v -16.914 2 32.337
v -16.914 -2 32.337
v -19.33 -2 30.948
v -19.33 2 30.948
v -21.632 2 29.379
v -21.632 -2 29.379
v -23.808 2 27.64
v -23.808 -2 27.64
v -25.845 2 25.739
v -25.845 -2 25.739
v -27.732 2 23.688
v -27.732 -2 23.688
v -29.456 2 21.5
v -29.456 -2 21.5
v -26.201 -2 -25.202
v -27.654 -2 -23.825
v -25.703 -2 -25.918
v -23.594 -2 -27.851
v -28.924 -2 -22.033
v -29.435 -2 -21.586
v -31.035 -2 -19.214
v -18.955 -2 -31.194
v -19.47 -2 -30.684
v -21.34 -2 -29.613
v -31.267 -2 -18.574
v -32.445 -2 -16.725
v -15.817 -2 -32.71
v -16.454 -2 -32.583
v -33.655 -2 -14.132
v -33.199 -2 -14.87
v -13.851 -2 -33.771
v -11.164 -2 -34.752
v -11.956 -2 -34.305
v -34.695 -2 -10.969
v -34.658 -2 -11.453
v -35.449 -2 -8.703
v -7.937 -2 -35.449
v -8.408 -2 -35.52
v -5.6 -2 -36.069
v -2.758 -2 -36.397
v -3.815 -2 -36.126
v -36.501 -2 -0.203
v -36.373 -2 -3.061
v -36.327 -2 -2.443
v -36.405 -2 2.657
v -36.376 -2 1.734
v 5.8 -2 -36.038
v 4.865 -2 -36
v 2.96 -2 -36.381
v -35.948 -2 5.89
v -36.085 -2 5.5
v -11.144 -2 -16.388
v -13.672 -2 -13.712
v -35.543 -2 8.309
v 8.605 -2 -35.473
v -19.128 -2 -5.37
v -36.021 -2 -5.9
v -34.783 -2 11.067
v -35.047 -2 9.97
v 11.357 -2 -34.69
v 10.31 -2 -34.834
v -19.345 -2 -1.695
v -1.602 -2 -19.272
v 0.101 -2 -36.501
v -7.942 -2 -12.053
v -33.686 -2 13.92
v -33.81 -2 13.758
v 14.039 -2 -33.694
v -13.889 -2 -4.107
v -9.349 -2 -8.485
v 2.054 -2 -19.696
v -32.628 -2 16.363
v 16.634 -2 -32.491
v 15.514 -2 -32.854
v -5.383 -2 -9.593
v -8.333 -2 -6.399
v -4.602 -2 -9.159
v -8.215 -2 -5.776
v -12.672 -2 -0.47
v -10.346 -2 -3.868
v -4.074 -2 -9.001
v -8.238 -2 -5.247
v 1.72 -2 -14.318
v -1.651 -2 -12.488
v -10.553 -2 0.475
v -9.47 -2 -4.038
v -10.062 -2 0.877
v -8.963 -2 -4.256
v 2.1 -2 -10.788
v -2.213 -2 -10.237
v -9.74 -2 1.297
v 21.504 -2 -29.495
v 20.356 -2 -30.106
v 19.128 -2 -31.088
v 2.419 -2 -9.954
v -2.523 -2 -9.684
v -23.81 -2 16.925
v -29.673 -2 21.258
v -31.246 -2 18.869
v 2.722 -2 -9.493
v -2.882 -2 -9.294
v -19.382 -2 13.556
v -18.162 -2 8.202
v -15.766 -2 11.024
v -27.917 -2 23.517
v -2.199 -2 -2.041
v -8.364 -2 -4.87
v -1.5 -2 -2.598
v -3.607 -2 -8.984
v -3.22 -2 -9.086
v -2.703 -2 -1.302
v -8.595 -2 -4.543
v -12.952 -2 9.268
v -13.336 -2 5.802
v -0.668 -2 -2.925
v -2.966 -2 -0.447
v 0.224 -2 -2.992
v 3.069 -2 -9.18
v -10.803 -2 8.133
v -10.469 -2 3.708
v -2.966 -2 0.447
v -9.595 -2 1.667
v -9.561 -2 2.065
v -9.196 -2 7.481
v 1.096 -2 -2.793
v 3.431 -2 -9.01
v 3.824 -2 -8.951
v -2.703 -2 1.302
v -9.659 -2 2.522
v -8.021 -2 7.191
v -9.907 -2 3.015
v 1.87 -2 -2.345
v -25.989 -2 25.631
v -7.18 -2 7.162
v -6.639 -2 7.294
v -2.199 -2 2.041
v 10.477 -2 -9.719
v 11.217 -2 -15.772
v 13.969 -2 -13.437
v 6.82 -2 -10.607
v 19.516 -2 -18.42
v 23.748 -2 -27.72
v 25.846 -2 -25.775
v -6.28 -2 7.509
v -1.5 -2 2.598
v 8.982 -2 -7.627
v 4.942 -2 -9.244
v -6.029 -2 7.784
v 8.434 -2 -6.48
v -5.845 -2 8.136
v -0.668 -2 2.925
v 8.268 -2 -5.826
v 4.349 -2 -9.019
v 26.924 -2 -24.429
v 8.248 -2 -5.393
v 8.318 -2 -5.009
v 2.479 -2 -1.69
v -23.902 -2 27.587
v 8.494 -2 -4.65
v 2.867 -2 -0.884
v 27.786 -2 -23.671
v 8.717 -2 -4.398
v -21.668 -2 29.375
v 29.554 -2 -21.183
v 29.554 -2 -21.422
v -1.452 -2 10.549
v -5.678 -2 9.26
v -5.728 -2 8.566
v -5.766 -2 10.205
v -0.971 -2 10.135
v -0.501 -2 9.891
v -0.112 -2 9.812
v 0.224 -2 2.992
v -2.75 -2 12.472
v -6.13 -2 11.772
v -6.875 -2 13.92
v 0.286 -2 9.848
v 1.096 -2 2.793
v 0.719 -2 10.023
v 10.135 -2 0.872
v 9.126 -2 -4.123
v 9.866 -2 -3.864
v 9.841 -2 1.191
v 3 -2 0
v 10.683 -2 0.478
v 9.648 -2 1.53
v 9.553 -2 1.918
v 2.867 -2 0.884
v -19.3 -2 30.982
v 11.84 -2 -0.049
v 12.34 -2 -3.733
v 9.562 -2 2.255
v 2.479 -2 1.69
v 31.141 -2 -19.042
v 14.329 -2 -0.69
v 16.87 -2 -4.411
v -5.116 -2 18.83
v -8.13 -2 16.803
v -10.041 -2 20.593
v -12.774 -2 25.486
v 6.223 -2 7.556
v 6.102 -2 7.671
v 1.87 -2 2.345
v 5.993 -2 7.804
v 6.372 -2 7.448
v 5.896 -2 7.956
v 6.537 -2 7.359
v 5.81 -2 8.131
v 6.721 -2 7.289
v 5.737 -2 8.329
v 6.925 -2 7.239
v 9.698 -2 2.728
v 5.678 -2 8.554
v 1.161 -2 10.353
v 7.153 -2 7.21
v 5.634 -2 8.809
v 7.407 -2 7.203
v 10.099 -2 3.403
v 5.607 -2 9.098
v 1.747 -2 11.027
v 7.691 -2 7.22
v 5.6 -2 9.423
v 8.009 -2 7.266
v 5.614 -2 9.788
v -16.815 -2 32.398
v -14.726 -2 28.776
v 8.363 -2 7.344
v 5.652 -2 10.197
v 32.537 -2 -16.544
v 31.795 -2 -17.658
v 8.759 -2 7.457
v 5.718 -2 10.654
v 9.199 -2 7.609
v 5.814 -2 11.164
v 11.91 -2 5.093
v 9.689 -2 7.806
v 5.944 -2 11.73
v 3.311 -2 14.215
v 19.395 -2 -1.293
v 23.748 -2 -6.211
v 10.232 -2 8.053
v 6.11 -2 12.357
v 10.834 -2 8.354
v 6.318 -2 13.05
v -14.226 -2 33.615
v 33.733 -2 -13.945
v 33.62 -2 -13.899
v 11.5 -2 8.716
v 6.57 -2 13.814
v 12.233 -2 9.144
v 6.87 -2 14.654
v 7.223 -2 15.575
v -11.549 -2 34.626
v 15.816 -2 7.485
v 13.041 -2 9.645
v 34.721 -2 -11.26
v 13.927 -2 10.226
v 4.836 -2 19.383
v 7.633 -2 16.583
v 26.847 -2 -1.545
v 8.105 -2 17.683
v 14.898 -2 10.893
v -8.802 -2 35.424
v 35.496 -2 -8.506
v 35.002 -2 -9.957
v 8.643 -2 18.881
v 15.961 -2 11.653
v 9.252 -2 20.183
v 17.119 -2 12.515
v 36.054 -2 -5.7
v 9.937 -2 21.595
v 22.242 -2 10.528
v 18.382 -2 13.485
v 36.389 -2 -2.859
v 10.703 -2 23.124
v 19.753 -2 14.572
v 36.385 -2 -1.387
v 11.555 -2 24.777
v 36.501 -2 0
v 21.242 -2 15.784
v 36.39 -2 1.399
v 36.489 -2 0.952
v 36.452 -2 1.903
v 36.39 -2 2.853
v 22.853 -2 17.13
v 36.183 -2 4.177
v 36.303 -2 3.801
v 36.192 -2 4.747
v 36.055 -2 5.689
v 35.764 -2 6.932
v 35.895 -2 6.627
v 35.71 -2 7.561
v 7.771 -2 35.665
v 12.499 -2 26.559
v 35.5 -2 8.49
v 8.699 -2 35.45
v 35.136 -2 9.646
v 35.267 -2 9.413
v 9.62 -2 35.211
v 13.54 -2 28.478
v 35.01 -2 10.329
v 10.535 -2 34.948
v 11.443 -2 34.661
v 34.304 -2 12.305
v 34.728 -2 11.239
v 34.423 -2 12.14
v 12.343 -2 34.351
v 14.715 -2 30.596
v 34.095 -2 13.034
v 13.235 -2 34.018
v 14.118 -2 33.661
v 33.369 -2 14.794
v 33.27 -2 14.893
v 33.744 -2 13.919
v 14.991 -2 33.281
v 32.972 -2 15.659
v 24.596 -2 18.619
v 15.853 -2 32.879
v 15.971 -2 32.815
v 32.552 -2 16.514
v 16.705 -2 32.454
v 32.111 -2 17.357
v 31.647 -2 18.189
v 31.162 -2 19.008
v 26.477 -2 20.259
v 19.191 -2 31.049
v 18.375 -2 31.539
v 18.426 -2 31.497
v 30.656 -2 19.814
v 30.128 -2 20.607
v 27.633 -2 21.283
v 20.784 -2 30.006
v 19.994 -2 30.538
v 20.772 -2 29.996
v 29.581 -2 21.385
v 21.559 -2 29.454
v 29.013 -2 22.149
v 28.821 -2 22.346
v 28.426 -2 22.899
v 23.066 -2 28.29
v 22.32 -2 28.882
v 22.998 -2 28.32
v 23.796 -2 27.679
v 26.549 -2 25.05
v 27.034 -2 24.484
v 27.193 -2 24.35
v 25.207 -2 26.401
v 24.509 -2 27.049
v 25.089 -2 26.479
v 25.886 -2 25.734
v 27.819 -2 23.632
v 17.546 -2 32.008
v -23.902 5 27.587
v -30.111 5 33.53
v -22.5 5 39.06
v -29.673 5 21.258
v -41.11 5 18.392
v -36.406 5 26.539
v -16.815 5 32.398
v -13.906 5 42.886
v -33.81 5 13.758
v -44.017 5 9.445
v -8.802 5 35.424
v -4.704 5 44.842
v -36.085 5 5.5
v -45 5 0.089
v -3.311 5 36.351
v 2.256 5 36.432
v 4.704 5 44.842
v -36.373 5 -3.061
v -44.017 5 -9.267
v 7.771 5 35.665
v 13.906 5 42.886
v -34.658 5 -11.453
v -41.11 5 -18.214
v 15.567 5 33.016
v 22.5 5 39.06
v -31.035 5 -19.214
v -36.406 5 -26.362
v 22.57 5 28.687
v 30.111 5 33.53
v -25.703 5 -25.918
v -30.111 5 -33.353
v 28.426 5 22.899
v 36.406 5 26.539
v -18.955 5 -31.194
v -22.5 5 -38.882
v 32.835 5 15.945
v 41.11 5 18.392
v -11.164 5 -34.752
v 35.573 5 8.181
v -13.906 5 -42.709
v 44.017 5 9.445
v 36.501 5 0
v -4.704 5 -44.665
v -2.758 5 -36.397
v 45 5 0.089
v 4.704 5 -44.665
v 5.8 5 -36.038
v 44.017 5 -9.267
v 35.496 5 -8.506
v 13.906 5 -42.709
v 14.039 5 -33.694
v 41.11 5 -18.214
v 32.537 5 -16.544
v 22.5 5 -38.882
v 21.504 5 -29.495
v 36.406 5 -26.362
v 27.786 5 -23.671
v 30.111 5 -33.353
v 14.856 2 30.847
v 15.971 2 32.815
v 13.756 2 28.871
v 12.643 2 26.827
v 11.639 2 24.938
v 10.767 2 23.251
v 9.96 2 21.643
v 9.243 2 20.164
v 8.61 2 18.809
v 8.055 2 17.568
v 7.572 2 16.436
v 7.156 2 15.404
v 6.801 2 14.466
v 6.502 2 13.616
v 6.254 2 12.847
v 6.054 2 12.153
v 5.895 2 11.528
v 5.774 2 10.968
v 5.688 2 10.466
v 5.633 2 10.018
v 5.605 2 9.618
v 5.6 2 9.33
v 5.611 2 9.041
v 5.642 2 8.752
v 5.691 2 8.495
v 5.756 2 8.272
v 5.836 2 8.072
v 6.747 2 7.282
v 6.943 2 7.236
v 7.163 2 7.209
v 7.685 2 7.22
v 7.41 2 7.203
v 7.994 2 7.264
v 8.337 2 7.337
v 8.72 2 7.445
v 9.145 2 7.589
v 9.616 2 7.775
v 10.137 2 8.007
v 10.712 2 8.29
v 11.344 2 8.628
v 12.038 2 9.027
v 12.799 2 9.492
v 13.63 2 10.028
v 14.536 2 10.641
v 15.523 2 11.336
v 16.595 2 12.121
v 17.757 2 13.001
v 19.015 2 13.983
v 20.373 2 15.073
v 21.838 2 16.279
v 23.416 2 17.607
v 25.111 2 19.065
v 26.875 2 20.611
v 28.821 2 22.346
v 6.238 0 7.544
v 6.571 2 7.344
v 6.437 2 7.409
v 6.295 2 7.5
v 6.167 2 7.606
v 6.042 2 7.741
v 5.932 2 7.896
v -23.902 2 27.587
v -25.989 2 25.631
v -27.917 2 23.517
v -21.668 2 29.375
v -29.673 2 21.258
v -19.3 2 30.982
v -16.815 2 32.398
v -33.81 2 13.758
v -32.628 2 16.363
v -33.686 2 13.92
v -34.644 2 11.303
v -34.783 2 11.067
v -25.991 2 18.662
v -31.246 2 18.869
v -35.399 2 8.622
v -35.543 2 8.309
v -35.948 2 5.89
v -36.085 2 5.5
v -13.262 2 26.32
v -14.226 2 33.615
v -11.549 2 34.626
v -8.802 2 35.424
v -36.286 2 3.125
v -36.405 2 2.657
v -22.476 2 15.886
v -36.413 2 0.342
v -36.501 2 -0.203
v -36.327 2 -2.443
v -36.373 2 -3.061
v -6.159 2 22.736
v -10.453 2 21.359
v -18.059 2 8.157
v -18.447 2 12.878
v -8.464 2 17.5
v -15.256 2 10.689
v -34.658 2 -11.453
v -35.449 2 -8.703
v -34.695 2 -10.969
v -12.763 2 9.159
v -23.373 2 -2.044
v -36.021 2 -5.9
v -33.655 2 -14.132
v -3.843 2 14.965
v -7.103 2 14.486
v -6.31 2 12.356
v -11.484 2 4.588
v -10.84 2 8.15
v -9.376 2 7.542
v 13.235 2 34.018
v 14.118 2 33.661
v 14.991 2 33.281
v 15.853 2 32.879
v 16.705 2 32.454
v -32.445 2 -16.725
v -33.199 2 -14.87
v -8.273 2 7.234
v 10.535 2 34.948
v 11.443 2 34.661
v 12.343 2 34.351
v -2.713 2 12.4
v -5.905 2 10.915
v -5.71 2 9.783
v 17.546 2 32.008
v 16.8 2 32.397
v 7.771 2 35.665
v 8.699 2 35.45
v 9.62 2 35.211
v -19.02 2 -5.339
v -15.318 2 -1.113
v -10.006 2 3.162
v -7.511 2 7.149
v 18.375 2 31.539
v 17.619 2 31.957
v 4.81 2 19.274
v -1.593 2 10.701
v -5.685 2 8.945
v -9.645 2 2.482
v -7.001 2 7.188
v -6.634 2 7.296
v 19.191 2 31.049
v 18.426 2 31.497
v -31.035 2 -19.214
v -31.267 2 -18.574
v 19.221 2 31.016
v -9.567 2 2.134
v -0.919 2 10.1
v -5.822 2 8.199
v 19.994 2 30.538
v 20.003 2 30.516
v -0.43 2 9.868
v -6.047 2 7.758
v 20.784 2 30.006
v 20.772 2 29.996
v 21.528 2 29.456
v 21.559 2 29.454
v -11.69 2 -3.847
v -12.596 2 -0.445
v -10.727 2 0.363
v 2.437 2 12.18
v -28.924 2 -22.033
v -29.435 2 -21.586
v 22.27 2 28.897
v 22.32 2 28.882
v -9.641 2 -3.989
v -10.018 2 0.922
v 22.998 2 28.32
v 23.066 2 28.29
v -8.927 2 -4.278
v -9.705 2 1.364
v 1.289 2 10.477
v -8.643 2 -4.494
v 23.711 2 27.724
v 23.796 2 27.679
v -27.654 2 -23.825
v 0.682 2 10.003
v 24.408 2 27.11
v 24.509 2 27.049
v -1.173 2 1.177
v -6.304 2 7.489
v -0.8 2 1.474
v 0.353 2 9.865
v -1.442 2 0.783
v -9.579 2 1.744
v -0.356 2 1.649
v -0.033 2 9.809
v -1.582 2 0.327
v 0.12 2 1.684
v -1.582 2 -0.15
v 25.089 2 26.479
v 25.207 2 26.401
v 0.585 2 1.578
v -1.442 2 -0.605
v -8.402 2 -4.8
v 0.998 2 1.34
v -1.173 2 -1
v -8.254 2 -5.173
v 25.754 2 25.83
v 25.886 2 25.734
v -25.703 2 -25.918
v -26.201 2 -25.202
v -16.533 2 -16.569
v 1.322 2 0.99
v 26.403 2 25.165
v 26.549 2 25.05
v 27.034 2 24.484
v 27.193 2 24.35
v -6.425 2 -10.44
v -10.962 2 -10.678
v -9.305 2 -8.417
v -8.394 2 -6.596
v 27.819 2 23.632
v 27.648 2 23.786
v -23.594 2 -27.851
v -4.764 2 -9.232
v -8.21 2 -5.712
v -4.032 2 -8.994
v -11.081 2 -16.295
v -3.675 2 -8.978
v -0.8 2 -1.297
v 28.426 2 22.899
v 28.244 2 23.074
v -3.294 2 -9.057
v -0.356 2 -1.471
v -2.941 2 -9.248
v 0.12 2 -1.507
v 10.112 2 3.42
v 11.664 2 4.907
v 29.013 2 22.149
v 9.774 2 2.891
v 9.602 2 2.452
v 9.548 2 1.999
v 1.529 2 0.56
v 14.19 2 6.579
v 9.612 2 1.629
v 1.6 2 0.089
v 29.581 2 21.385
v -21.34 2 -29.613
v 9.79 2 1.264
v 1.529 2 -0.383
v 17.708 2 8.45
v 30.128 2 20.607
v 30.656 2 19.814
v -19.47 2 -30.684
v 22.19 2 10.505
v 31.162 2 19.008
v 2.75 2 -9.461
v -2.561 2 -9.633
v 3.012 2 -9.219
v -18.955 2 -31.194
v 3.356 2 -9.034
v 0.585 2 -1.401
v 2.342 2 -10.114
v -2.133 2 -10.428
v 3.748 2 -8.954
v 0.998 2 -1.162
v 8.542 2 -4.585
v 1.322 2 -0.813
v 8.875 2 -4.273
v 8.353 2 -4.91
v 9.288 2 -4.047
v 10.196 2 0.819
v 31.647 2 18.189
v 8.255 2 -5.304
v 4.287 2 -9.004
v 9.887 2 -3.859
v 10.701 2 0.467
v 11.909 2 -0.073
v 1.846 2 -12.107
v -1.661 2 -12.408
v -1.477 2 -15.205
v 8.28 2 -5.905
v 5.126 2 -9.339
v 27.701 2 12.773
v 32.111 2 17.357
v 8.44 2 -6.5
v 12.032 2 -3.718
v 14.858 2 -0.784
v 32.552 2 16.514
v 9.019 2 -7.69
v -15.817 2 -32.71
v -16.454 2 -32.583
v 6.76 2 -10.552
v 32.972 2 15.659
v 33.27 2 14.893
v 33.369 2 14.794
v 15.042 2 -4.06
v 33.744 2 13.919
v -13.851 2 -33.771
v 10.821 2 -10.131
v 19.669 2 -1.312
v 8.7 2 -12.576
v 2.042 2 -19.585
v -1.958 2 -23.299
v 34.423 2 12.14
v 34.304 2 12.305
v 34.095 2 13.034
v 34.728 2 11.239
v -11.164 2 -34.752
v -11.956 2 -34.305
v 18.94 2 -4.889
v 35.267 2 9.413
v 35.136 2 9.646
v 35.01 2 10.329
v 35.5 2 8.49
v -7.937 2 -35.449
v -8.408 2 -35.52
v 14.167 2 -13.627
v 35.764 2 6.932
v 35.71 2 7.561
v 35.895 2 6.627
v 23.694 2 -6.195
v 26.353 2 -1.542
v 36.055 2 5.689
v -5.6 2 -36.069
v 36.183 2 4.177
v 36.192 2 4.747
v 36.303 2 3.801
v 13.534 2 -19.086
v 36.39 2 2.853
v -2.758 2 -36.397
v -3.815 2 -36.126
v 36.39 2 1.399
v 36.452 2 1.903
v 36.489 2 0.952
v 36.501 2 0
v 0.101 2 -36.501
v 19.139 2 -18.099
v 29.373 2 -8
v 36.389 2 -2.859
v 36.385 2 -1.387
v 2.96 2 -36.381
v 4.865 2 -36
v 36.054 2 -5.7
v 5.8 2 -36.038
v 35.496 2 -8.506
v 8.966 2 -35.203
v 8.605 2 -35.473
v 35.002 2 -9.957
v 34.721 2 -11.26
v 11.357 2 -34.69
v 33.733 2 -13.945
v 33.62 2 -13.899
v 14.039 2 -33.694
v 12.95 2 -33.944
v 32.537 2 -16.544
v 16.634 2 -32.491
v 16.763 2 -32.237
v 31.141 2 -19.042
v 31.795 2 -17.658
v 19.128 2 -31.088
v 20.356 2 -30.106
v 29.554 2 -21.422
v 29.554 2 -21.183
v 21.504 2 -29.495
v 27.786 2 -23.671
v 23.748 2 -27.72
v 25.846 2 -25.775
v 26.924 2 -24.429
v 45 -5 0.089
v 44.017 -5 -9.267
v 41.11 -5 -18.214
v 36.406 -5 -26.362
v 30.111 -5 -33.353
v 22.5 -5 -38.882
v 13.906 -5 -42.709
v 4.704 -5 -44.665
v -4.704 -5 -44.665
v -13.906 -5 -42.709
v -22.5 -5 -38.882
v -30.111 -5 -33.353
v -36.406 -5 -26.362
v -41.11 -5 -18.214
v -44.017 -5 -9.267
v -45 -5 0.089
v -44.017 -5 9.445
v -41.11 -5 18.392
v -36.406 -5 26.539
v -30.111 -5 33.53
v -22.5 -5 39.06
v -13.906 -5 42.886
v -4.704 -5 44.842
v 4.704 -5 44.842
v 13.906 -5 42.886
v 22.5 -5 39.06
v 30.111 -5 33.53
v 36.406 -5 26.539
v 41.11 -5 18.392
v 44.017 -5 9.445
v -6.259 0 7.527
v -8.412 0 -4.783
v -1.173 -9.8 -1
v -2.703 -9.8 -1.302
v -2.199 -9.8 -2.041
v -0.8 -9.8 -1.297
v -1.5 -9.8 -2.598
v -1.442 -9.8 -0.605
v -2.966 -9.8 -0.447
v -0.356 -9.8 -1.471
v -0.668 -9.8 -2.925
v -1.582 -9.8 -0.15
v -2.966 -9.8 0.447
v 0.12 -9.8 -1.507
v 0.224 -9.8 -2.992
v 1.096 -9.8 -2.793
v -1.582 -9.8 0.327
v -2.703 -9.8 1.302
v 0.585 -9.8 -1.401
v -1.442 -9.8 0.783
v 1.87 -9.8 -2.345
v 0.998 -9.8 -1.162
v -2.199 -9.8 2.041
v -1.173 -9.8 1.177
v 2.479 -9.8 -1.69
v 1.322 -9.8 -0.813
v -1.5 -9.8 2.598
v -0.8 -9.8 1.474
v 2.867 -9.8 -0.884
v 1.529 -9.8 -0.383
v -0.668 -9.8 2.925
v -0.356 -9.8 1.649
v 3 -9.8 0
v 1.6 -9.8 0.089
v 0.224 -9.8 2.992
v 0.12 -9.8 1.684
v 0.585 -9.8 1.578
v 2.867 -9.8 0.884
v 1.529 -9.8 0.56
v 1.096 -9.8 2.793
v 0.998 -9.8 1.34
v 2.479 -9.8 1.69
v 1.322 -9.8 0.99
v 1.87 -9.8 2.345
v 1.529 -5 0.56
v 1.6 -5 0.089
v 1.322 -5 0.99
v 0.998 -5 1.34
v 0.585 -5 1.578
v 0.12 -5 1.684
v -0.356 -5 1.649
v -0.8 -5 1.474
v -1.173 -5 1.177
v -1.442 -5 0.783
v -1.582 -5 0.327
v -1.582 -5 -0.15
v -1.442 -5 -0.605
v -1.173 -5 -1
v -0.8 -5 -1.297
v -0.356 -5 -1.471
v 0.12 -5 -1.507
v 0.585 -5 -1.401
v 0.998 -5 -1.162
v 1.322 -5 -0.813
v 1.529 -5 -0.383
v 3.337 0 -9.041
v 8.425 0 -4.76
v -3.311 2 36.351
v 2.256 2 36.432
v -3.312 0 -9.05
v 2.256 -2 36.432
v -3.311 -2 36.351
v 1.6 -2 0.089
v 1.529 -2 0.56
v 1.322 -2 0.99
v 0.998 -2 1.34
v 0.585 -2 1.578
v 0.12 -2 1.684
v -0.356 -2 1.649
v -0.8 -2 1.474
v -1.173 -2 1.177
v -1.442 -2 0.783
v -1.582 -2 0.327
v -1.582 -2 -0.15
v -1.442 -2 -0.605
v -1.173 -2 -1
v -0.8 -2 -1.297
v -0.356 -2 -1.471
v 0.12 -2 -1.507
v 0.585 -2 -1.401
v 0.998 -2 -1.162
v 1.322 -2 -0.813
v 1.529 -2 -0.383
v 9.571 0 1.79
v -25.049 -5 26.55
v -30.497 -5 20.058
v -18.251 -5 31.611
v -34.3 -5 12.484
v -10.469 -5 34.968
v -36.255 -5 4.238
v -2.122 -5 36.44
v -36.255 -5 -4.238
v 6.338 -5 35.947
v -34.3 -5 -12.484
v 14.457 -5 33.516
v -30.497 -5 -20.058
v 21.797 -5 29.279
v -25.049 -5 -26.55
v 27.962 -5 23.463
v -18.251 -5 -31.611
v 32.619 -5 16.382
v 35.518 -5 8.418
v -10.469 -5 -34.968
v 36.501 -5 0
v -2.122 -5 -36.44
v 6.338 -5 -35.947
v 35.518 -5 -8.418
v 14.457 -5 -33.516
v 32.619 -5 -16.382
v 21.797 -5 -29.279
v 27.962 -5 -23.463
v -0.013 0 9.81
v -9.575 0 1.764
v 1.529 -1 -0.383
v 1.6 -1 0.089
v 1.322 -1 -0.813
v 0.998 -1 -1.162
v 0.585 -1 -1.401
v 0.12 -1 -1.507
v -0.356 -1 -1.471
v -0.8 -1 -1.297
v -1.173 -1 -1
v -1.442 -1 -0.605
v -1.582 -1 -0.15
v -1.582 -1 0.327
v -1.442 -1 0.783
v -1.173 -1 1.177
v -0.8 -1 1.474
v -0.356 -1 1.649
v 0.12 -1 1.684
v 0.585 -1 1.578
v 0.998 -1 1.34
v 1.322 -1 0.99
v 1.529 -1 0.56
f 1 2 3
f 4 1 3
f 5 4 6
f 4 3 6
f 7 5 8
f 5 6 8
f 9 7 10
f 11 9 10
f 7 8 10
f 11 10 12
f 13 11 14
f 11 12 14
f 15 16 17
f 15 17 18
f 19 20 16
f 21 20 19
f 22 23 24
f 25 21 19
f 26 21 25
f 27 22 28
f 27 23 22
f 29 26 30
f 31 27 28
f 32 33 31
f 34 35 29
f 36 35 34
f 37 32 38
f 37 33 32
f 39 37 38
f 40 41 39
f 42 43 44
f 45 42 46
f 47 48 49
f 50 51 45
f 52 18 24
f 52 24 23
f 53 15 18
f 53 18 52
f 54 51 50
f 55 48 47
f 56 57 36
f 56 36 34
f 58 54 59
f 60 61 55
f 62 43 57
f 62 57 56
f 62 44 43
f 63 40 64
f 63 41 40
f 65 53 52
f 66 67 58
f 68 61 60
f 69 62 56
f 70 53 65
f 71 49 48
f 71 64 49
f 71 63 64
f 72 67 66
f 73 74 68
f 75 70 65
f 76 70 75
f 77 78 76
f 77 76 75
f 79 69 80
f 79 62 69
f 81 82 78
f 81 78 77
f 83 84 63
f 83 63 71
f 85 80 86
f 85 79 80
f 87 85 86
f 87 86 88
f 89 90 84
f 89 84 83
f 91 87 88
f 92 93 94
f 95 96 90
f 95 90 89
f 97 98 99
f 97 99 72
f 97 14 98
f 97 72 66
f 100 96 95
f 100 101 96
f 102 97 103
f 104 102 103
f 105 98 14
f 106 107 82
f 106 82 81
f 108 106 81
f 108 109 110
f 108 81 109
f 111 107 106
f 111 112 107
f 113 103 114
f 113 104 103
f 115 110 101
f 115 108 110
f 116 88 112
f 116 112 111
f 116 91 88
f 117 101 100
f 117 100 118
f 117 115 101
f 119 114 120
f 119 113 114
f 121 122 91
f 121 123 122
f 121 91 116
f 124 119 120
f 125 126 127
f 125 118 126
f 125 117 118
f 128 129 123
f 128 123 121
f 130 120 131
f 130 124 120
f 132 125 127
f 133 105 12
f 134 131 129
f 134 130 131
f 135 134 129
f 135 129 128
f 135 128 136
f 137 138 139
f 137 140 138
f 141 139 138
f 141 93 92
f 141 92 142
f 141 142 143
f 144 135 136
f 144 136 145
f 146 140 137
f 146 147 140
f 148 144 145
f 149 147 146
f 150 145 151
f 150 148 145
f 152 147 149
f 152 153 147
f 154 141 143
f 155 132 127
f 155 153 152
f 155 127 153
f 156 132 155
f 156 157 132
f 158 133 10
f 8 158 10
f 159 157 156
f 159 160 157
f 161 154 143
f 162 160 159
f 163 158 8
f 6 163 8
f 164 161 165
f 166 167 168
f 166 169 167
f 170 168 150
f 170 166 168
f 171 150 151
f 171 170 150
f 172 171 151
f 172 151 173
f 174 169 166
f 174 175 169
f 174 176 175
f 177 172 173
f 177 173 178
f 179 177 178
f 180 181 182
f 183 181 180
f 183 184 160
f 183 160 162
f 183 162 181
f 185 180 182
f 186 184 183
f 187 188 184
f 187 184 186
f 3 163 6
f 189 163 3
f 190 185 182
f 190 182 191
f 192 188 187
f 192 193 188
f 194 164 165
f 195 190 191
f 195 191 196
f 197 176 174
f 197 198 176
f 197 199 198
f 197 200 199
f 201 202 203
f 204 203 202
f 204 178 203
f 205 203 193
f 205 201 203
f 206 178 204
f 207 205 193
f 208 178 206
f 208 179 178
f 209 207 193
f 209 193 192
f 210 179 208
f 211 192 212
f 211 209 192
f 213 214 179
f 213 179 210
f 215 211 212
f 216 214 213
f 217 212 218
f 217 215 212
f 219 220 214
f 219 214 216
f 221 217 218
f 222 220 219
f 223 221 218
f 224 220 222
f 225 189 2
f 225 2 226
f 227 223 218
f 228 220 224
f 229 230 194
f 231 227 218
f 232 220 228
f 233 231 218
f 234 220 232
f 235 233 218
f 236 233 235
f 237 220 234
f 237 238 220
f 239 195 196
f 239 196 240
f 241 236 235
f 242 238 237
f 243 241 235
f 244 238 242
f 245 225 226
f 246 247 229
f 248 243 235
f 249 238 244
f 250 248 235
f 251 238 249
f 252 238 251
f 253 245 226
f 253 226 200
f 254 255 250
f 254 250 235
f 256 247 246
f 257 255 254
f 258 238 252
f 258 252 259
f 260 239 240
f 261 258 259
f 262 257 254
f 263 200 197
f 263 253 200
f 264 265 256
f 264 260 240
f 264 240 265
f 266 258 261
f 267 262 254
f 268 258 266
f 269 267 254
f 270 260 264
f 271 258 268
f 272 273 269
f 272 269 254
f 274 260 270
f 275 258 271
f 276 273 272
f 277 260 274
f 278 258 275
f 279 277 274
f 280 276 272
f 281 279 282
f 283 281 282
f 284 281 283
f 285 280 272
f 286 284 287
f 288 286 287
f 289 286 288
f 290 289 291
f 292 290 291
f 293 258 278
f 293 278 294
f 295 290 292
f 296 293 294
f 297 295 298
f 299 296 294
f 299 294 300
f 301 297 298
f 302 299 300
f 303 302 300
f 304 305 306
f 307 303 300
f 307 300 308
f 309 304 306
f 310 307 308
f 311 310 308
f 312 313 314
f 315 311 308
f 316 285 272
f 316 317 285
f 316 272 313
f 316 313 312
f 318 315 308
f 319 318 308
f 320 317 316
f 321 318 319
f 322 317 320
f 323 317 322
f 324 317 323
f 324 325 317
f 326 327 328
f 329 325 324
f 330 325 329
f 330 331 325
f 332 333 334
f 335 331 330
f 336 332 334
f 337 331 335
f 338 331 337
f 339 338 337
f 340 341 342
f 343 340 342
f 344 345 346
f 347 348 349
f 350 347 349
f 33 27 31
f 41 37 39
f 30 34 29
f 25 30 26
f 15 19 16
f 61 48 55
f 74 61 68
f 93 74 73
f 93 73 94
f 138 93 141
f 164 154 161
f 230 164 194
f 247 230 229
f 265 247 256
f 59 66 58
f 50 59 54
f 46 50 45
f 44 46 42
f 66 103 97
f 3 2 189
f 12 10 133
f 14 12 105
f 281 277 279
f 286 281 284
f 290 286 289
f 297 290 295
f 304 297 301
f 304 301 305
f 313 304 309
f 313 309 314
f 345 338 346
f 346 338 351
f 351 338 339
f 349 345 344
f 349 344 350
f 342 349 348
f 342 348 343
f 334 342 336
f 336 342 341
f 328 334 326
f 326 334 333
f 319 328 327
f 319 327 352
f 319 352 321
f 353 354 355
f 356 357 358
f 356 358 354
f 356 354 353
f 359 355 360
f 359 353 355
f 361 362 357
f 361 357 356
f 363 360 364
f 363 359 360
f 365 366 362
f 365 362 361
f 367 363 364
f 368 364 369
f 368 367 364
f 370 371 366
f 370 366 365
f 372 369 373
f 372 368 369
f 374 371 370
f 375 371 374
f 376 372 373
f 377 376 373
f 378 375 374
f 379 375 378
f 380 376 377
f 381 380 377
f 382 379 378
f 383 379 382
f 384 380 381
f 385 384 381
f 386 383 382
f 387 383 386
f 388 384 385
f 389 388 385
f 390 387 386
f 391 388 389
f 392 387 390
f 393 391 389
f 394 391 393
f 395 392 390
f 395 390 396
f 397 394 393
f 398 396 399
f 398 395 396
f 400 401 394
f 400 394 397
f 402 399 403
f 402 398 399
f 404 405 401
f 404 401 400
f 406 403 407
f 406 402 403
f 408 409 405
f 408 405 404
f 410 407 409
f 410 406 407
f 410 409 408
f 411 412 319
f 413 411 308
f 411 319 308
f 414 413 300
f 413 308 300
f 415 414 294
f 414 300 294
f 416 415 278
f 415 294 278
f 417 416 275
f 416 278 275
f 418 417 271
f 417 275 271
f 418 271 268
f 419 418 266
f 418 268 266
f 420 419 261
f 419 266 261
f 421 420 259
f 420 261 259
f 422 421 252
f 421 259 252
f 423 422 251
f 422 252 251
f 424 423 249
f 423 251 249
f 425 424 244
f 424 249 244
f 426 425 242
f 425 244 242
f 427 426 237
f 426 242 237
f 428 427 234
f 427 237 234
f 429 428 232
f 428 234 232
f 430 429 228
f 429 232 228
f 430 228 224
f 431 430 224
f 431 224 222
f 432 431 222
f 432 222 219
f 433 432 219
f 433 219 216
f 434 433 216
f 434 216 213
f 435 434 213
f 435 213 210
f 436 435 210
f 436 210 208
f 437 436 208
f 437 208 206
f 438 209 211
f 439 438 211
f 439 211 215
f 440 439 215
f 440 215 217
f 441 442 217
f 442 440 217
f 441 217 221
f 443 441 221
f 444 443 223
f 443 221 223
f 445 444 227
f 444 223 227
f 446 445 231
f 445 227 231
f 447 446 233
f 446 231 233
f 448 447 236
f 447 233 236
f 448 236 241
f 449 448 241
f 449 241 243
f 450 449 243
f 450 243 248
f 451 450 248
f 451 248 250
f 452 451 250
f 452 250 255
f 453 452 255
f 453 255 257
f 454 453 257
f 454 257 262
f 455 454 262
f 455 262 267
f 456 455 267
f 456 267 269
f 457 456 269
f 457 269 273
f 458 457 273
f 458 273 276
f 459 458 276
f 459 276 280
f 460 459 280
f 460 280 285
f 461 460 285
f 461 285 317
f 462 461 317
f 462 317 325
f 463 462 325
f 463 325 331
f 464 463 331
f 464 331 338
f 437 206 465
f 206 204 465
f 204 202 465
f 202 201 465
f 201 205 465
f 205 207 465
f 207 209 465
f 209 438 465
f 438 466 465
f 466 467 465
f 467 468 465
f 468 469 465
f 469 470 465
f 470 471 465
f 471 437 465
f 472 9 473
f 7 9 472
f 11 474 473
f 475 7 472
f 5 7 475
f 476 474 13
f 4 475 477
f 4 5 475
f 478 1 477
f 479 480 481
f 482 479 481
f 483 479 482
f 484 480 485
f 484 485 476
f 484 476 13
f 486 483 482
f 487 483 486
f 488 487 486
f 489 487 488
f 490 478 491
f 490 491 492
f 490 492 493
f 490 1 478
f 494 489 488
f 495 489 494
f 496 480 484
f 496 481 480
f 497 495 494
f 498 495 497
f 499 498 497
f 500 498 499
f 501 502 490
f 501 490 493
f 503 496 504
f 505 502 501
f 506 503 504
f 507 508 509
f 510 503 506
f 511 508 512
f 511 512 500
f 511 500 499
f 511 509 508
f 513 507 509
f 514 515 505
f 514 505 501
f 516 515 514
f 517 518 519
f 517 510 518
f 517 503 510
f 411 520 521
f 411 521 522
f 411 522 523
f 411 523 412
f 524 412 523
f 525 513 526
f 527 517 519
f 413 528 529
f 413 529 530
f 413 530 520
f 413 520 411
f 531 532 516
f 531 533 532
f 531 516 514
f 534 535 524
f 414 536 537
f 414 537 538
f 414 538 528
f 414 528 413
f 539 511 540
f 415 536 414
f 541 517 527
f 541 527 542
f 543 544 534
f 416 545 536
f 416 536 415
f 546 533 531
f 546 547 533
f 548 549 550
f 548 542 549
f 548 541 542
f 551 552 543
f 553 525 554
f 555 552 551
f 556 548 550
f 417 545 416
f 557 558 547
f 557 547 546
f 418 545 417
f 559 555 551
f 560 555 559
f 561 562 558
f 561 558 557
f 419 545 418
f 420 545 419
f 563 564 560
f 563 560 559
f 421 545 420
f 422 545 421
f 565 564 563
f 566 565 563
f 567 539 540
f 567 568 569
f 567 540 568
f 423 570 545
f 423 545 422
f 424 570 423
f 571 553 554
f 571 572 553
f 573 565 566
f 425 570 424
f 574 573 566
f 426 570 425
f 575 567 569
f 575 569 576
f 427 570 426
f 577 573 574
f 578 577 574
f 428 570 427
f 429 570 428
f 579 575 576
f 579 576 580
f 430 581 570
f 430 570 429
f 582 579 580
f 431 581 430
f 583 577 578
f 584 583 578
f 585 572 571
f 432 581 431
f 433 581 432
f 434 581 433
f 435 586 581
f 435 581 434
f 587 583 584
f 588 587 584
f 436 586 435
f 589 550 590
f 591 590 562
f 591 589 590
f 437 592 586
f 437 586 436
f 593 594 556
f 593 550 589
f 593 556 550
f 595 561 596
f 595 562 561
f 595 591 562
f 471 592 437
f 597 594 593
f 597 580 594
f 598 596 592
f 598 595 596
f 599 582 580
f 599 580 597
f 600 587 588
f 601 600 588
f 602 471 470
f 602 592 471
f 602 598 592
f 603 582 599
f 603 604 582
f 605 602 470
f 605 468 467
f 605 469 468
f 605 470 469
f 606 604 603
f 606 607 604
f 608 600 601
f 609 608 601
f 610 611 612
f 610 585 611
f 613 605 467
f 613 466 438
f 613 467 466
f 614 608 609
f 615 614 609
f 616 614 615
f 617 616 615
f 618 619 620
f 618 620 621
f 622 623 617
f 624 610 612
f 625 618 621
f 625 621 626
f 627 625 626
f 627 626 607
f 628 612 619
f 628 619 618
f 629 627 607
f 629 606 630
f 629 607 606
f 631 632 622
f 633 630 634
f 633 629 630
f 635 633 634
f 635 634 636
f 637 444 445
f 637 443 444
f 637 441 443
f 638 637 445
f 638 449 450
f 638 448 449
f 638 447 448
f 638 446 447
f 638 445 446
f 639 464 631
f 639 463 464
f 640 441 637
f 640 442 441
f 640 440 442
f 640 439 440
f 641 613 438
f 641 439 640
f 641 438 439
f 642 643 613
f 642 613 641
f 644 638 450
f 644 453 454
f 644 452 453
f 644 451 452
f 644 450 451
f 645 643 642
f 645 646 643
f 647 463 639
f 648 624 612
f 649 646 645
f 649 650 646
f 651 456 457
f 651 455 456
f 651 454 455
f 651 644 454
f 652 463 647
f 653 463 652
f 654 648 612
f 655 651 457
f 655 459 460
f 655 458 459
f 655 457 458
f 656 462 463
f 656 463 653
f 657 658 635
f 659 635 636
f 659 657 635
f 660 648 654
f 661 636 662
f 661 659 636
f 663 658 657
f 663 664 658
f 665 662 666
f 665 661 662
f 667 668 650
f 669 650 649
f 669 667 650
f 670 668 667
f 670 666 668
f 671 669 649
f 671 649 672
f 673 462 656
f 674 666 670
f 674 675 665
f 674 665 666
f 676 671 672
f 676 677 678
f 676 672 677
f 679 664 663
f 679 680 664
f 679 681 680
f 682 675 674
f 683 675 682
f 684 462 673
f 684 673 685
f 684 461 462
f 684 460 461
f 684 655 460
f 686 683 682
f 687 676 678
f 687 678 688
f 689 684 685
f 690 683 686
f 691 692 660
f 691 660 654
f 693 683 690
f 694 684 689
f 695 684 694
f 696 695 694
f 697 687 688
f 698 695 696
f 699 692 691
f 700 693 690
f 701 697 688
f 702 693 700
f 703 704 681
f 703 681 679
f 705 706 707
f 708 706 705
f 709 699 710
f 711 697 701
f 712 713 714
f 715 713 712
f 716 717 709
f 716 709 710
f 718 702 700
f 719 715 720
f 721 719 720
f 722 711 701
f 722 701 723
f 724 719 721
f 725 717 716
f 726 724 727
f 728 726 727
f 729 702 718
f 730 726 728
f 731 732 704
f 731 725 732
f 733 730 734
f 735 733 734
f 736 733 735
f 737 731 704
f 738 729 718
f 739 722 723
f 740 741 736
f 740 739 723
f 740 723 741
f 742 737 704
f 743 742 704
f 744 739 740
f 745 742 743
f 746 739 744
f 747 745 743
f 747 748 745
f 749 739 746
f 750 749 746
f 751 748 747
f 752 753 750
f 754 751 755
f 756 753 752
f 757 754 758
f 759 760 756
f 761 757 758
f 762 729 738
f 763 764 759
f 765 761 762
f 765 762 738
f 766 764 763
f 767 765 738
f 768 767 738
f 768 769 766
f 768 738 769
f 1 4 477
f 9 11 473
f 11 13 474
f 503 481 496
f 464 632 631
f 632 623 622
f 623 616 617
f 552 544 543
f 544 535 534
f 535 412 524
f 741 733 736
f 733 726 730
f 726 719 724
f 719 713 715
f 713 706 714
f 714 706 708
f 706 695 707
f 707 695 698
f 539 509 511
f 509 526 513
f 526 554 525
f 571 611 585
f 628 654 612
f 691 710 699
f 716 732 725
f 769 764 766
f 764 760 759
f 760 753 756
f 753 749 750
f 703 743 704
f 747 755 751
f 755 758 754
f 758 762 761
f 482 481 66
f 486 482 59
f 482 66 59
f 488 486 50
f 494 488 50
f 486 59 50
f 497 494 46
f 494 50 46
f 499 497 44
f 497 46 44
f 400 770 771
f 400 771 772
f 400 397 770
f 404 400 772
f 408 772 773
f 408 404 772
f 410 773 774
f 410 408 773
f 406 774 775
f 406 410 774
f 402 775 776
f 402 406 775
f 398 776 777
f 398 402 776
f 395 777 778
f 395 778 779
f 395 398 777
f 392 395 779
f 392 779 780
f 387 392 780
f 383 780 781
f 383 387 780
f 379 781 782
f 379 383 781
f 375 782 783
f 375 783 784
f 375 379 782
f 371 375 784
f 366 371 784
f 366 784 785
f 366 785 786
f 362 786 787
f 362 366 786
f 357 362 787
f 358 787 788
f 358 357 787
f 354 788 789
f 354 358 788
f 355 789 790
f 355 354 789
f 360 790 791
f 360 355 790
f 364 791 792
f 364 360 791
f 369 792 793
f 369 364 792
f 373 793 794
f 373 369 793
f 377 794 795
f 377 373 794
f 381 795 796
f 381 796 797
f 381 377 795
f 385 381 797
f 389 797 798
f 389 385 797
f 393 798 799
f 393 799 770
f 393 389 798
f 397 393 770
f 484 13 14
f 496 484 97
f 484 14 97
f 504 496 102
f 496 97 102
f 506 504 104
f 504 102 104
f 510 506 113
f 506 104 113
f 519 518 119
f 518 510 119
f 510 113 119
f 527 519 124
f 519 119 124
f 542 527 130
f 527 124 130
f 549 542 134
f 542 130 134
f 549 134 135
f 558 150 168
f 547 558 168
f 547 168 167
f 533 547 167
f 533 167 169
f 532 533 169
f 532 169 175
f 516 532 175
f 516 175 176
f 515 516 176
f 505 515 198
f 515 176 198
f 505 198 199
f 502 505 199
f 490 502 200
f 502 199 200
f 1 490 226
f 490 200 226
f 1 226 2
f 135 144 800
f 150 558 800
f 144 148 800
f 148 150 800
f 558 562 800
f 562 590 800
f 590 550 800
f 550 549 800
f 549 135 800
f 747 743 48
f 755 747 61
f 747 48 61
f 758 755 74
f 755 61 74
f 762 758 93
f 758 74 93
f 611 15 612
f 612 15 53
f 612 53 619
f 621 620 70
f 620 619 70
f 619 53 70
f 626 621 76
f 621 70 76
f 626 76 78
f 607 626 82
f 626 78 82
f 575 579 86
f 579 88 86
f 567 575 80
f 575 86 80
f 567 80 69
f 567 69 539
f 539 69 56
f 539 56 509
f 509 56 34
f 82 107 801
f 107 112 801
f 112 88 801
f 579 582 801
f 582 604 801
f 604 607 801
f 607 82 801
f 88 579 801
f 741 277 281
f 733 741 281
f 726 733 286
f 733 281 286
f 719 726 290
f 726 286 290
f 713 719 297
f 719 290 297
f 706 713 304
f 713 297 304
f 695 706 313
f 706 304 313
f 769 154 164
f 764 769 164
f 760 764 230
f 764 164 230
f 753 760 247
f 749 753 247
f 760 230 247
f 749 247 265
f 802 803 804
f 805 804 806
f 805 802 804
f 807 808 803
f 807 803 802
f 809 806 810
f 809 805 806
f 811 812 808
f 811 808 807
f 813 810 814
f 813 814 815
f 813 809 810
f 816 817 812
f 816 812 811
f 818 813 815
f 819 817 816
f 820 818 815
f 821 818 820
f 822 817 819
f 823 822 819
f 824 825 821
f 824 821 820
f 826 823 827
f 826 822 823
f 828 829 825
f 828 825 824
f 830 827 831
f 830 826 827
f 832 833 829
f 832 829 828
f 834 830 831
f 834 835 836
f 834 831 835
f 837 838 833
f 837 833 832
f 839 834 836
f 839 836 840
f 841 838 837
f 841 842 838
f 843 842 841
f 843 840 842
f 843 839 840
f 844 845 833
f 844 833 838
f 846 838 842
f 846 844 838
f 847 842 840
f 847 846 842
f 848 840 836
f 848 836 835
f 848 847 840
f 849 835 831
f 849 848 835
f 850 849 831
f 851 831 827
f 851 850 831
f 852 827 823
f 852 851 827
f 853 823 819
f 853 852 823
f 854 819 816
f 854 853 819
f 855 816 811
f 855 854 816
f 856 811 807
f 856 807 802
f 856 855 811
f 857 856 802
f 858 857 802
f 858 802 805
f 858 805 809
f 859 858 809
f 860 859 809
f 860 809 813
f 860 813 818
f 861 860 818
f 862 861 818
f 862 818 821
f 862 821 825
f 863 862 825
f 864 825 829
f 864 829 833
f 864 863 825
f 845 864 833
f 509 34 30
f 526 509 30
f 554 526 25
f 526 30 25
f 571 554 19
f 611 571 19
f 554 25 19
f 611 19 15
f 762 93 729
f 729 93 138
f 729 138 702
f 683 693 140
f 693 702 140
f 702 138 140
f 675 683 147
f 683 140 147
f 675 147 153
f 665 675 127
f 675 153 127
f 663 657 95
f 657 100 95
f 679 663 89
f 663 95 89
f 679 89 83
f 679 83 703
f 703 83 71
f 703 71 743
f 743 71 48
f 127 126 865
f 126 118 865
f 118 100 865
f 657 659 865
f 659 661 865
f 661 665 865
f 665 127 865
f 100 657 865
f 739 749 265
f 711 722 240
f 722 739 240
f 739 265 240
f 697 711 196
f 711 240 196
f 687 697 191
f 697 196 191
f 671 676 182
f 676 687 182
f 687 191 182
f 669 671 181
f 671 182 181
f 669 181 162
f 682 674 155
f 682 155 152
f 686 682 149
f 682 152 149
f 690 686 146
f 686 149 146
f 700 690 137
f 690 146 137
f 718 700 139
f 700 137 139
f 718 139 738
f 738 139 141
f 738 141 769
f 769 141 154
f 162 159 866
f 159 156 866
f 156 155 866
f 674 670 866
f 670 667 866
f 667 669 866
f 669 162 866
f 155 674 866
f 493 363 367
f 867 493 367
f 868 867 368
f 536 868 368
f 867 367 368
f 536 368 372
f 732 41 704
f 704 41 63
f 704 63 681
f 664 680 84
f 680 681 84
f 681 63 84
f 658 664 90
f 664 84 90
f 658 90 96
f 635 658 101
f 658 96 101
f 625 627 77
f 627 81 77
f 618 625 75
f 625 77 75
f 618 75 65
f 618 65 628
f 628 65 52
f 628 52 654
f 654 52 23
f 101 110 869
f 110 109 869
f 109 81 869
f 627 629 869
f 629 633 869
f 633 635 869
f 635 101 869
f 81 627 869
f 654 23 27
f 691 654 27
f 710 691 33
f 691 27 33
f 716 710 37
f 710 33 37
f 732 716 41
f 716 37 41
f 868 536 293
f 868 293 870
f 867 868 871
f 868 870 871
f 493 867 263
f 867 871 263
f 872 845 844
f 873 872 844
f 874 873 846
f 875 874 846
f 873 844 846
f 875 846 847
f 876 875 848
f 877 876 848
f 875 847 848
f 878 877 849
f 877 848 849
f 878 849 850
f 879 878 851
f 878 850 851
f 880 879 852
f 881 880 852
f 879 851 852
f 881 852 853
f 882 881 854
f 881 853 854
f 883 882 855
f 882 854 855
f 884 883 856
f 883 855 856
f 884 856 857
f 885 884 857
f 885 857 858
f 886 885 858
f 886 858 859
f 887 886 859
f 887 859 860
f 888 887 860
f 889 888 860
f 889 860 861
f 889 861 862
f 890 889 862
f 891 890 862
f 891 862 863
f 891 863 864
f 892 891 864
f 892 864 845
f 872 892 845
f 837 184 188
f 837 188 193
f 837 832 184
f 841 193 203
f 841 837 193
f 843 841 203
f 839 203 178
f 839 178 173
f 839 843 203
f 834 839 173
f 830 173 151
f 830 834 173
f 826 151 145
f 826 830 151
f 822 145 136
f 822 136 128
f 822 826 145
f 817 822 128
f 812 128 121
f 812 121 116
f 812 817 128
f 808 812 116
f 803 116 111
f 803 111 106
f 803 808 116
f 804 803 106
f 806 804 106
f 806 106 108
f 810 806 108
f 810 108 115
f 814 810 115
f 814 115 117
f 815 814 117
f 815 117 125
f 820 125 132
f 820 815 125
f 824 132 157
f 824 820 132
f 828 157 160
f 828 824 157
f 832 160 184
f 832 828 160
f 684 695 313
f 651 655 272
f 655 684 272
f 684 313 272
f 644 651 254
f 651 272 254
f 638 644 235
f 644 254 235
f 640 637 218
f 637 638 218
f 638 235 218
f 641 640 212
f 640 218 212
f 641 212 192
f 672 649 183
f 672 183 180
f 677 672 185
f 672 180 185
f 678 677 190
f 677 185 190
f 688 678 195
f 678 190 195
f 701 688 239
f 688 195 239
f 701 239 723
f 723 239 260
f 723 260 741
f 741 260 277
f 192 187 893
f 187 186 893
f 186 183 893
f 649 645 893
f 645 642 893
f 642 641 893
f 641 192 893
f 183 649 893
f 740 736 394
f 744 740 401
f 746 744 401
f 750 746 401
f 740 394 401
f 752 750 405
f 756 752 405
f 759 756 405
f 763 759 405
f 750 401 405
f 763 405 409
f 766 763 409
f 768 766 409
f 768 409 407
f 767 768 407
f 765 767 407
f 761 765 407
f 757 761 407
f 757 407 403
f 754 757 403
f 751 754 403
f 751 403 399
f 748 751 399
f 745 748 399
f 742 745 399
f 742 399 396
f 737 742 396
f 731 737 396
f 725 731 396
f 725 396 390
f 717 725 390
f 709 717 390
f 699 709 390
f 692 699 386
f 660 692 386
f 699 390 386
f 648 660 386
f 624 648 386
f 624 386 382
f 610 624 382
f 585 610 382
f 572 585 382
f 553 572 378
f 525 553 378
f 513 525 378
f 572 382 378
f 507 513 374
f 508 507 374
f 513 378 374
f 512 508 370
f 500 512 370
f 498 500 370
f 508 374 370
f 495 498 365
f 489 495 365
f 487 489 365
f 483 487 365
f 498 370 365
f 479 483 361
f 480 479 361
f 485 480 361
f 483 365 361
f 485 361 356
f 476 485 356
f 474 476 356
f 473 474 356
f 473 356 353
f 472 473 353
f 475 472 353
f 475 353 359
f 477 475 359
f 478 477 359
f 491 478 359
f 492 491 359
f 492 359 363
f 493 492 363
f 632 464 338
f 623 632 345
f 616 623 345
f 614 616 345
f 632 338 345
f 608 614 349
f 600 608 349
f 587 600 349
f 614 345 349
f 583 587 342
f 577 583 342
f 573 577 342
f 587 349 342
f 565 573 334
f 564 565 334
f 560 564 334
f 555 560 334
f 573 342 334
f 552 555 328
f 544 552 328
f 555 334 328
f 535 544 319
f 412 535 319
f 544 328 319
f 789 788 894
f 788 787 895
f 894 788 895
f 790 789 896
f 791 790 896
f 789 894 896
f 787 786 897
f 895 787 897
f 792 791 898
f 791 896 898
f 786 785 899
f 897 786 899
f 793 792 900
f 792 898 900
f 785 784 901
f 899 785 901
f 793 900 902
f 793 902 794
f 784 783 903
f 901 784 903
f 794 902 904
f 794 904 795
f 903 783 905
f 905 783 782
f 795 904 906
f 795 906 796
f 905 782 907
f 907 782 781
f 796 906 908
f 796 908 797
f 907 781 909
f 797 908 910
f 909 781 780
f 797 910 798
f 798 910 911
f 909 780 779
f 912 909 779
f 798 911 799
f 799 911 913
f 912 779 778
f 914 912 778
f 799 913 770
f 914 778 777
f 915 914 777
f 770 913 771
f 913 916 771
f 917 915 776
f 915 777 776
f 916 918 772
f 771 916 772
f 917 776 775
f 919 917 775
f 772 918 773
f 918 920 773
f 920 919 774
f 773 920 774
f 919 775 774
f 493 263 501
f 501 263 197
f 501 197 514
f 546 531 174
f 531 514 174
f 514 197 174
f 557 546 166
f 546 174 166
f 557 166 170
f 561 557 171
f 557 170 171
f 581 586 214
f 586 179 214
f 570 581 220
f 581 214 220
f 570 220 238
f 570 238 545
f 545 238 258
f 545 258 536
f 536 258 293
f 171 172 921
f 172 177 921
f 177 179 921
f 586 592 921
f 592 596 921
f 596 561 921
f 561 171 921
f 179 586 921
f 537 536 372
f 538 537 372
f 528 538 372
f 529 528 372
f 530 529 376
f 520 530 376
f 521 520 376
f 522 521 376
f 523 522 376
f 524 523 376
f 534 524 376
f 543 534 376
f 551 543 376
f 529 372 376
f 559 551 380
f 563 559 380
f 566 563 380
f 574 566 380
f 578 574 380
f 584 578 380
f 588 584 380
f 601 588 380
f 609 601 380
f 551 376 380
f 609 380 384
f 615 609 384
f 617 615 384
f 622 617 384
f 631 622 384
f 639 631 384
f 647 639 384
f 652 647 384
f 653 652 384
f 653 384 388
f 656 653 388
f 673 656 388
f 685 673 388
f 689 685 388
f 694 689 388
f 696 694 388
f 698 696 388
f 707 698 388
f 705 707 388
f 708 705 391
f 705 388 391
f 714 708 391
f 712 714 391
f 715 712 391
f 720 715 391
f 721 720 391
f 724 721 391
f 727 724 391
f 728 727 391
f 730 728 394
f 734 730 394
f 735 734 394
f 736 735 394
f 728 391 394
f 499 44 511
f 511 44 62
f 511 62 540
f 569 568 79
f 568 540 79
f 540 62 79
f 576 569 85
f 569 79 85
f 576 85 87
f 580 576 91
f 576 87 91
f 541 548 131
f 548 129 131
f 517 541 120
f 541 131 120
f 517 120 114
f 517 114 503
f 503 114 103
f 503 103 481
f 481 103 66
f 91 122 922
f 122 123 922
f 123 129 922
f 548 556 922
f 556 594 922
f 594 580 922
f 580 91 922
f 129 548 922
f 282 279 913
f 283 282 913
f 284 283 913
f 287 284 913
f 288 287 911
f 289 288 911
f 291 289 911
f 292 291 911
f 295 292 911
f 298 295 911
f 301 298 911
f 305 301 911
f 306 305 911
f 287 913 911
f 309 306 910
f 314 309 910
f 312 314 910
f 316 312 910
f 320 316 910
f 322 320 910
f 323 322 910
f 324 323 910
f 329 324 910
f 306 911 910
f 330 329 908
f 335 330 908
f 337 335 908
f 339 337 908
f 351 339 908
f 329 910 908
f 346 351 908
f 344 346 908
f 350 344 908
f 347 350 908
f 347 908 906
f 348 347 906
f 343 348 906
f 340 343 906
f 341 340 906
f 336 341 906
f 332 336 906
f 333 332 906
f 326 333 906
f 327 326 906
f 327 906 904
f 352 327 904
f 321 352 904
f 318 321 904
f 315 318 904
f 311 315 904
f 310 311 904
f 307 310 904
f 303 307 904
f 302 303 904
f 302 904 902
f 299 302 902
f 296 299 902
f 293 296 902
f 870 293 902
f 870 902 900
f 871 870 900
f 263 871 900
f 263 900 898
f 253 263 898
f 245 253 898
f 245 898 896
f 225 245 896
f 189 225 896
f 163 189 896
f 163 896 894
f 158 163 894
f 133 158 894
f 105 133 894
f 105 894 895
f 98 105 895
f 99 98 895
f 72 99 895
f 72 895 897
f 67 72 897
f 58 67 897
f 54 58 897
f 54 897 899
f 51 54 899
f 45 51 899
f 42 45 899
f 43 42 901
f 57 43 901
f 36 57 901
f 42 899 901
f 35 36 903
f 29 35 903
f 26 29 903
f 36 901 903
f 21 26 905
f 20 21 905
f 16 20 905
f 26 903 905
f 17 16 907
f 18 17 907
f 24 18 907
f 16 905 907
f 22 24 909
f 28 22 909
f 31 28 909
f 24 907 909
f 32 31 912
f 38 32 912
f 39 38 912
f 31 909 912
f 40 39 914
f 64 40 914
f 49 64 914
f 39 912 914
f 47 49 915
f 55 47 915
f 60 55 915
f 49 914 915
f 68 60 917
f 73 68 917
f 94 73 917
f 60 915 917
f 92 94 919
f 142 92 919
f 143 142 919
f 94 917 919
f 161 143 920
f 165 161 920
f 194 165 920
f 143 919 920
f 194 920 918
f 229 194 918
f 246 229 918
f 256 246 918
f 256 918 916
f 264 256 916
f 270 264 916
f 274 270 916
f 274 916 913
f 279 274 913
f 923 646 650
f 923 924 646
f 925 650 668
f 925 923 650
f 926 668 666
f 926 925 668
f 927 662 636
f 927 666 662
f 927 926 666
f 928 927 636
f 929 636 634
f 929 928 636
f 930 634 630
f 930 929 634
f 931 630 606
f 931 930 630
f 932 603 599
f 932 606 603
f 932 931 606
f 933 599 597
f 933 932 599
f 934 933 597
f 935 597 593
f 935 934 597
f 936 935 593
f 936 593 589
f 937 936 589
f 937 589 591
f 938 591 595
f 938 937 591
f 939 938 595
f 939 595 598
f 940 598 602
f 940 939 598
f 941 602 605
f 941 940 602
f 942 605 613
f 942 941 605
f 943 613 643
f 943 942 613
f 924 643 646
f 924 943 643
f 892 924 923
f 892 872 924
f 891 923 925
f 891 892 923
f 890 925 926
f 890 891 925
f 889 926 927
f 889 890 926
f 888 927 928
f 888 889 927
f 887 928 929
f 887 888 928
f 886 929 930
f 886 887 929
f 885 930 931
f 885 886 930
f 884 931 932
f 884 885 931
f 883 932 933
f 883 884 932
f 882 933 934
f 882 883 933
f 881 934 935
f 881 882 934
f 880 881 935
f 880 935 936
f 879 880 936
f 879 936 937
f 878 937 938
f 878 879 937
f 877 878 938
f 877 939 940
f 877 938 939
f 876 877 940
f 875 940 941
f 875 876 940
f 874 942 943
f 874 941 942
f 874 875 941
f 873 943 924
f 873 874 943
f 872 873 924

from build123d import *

# Parameters (mm, degrees)
SKETCH1_R                = 45
SKETCH1_R_2              = 1.6
BOSS_EXTRUDE1_DEPTH      = 5
SKETCH4_R                = 36.501480924
CUT_EXTRUDE1_DEPTH       = 3
SKETCH5_R                = 36.501480924
CUT_EXTRUDE2_DEPTH       = 3
SKETCH2_R                = 3
SKETCH2_R_2              = 1.6
BOSS_EXTRUDE2_DEPTH      = 4.8
BOSS_EXTRUDE2_DEPTH_BACK = 4
CUT_EXTRUDE3_DEPTH       = 10
CIRPATTERN1_COUNT        = 9


with BuildPart() as part:
    # Sketch1 → Boss-Extrude1 (new body, symmetric)
    with BuildSketch(Plane(origin=(0, 0, 0), x_dir=(1, 0, 0), z_dir=(0, 1, 0))):
        with Locations((0, -0.088724957)):
            Circle(SKETCH1_R)
        with Locations((0, -0.088724957)):
            Circle(SKETCH1_R_2, mode=Mode.SUBTRACT)
    extrude(amount=BOSS_EXTRUDE1_DEPTH, both=True)

    # Sketch4 → Cut-Extrude1 (cut)
    with BuildSketch(Plane(origin=(0, 5, 0), x_dir=(1, 0, 0), z_dir=(0, 1, 0))):
        Circle(SKETCH4_R)
    extrude(amount=-CUT_EXTRUDE1_DEPTH, mode=Mode.SUBTRACT)

    # Sketch5 → Cut-Extrude2 (cut)
    with BuildSketch(Plane.XZ.offset(5)):
        Circle(SKETCH5_R)
    extrude(amount=-CUT_EXTRUDE2_DEPTH, mode=Mode.SUBTRACT)

    # Sketch2 → Boss-Extrude2 (add, two sides)
    with BuildSketch(Plane.XZ.offset(5)) as boss_extrude2_sk:
        Circle(SKETCH2_R)
        with Locations((0, 0.088724957)):
            Circle(SKETCH2_R_2, mode=Mode.SUBTRACT)
    extrude(amount=BOSS_EXTRUDE2_DEPTH)
    extrude(boss_extrude2_sk.sketch, amount=-BOSS_EXTRUDE2_DEPTH_BACK)

    # Sketch6 → Cut-Extrude3 (cut)
    with BuildSketch(Plane.XZ.offset(2)):
        with BuildLine():
            ThreePointArc((7.771439261, 35.664588059), (-0.52889107, 36.497649018), (-8.801597259, 35.424426535))
            add(Edge.make_bspline(
                [(-8.801597259, 35.424426535), (0.488382971, -15.925400328), (7.771439261, 35.664588059)],
                knots=[0, 0, 0, 1, 1, 1], degree=2))
        make_face()
    cut_extrude3 = extrude(amount=-CUT_EXTRUDE3_DEPTH, mode=Mode.SUBTRACT)

    # CirPattern1: Cut-Extrude3 ×9 about axis
    cirpattern1_axis = Axis((0, 5, 0.088724957), (0, -1, 0))
    for i in range(1, CIRPATTERN1_COUNT):
        add(cut_extrude3.rotate(cirpattern1_axis, i * 360 / CIRPATTERN1_COUNT), mode=Mode.SUBTRACT)


solid = part.part
